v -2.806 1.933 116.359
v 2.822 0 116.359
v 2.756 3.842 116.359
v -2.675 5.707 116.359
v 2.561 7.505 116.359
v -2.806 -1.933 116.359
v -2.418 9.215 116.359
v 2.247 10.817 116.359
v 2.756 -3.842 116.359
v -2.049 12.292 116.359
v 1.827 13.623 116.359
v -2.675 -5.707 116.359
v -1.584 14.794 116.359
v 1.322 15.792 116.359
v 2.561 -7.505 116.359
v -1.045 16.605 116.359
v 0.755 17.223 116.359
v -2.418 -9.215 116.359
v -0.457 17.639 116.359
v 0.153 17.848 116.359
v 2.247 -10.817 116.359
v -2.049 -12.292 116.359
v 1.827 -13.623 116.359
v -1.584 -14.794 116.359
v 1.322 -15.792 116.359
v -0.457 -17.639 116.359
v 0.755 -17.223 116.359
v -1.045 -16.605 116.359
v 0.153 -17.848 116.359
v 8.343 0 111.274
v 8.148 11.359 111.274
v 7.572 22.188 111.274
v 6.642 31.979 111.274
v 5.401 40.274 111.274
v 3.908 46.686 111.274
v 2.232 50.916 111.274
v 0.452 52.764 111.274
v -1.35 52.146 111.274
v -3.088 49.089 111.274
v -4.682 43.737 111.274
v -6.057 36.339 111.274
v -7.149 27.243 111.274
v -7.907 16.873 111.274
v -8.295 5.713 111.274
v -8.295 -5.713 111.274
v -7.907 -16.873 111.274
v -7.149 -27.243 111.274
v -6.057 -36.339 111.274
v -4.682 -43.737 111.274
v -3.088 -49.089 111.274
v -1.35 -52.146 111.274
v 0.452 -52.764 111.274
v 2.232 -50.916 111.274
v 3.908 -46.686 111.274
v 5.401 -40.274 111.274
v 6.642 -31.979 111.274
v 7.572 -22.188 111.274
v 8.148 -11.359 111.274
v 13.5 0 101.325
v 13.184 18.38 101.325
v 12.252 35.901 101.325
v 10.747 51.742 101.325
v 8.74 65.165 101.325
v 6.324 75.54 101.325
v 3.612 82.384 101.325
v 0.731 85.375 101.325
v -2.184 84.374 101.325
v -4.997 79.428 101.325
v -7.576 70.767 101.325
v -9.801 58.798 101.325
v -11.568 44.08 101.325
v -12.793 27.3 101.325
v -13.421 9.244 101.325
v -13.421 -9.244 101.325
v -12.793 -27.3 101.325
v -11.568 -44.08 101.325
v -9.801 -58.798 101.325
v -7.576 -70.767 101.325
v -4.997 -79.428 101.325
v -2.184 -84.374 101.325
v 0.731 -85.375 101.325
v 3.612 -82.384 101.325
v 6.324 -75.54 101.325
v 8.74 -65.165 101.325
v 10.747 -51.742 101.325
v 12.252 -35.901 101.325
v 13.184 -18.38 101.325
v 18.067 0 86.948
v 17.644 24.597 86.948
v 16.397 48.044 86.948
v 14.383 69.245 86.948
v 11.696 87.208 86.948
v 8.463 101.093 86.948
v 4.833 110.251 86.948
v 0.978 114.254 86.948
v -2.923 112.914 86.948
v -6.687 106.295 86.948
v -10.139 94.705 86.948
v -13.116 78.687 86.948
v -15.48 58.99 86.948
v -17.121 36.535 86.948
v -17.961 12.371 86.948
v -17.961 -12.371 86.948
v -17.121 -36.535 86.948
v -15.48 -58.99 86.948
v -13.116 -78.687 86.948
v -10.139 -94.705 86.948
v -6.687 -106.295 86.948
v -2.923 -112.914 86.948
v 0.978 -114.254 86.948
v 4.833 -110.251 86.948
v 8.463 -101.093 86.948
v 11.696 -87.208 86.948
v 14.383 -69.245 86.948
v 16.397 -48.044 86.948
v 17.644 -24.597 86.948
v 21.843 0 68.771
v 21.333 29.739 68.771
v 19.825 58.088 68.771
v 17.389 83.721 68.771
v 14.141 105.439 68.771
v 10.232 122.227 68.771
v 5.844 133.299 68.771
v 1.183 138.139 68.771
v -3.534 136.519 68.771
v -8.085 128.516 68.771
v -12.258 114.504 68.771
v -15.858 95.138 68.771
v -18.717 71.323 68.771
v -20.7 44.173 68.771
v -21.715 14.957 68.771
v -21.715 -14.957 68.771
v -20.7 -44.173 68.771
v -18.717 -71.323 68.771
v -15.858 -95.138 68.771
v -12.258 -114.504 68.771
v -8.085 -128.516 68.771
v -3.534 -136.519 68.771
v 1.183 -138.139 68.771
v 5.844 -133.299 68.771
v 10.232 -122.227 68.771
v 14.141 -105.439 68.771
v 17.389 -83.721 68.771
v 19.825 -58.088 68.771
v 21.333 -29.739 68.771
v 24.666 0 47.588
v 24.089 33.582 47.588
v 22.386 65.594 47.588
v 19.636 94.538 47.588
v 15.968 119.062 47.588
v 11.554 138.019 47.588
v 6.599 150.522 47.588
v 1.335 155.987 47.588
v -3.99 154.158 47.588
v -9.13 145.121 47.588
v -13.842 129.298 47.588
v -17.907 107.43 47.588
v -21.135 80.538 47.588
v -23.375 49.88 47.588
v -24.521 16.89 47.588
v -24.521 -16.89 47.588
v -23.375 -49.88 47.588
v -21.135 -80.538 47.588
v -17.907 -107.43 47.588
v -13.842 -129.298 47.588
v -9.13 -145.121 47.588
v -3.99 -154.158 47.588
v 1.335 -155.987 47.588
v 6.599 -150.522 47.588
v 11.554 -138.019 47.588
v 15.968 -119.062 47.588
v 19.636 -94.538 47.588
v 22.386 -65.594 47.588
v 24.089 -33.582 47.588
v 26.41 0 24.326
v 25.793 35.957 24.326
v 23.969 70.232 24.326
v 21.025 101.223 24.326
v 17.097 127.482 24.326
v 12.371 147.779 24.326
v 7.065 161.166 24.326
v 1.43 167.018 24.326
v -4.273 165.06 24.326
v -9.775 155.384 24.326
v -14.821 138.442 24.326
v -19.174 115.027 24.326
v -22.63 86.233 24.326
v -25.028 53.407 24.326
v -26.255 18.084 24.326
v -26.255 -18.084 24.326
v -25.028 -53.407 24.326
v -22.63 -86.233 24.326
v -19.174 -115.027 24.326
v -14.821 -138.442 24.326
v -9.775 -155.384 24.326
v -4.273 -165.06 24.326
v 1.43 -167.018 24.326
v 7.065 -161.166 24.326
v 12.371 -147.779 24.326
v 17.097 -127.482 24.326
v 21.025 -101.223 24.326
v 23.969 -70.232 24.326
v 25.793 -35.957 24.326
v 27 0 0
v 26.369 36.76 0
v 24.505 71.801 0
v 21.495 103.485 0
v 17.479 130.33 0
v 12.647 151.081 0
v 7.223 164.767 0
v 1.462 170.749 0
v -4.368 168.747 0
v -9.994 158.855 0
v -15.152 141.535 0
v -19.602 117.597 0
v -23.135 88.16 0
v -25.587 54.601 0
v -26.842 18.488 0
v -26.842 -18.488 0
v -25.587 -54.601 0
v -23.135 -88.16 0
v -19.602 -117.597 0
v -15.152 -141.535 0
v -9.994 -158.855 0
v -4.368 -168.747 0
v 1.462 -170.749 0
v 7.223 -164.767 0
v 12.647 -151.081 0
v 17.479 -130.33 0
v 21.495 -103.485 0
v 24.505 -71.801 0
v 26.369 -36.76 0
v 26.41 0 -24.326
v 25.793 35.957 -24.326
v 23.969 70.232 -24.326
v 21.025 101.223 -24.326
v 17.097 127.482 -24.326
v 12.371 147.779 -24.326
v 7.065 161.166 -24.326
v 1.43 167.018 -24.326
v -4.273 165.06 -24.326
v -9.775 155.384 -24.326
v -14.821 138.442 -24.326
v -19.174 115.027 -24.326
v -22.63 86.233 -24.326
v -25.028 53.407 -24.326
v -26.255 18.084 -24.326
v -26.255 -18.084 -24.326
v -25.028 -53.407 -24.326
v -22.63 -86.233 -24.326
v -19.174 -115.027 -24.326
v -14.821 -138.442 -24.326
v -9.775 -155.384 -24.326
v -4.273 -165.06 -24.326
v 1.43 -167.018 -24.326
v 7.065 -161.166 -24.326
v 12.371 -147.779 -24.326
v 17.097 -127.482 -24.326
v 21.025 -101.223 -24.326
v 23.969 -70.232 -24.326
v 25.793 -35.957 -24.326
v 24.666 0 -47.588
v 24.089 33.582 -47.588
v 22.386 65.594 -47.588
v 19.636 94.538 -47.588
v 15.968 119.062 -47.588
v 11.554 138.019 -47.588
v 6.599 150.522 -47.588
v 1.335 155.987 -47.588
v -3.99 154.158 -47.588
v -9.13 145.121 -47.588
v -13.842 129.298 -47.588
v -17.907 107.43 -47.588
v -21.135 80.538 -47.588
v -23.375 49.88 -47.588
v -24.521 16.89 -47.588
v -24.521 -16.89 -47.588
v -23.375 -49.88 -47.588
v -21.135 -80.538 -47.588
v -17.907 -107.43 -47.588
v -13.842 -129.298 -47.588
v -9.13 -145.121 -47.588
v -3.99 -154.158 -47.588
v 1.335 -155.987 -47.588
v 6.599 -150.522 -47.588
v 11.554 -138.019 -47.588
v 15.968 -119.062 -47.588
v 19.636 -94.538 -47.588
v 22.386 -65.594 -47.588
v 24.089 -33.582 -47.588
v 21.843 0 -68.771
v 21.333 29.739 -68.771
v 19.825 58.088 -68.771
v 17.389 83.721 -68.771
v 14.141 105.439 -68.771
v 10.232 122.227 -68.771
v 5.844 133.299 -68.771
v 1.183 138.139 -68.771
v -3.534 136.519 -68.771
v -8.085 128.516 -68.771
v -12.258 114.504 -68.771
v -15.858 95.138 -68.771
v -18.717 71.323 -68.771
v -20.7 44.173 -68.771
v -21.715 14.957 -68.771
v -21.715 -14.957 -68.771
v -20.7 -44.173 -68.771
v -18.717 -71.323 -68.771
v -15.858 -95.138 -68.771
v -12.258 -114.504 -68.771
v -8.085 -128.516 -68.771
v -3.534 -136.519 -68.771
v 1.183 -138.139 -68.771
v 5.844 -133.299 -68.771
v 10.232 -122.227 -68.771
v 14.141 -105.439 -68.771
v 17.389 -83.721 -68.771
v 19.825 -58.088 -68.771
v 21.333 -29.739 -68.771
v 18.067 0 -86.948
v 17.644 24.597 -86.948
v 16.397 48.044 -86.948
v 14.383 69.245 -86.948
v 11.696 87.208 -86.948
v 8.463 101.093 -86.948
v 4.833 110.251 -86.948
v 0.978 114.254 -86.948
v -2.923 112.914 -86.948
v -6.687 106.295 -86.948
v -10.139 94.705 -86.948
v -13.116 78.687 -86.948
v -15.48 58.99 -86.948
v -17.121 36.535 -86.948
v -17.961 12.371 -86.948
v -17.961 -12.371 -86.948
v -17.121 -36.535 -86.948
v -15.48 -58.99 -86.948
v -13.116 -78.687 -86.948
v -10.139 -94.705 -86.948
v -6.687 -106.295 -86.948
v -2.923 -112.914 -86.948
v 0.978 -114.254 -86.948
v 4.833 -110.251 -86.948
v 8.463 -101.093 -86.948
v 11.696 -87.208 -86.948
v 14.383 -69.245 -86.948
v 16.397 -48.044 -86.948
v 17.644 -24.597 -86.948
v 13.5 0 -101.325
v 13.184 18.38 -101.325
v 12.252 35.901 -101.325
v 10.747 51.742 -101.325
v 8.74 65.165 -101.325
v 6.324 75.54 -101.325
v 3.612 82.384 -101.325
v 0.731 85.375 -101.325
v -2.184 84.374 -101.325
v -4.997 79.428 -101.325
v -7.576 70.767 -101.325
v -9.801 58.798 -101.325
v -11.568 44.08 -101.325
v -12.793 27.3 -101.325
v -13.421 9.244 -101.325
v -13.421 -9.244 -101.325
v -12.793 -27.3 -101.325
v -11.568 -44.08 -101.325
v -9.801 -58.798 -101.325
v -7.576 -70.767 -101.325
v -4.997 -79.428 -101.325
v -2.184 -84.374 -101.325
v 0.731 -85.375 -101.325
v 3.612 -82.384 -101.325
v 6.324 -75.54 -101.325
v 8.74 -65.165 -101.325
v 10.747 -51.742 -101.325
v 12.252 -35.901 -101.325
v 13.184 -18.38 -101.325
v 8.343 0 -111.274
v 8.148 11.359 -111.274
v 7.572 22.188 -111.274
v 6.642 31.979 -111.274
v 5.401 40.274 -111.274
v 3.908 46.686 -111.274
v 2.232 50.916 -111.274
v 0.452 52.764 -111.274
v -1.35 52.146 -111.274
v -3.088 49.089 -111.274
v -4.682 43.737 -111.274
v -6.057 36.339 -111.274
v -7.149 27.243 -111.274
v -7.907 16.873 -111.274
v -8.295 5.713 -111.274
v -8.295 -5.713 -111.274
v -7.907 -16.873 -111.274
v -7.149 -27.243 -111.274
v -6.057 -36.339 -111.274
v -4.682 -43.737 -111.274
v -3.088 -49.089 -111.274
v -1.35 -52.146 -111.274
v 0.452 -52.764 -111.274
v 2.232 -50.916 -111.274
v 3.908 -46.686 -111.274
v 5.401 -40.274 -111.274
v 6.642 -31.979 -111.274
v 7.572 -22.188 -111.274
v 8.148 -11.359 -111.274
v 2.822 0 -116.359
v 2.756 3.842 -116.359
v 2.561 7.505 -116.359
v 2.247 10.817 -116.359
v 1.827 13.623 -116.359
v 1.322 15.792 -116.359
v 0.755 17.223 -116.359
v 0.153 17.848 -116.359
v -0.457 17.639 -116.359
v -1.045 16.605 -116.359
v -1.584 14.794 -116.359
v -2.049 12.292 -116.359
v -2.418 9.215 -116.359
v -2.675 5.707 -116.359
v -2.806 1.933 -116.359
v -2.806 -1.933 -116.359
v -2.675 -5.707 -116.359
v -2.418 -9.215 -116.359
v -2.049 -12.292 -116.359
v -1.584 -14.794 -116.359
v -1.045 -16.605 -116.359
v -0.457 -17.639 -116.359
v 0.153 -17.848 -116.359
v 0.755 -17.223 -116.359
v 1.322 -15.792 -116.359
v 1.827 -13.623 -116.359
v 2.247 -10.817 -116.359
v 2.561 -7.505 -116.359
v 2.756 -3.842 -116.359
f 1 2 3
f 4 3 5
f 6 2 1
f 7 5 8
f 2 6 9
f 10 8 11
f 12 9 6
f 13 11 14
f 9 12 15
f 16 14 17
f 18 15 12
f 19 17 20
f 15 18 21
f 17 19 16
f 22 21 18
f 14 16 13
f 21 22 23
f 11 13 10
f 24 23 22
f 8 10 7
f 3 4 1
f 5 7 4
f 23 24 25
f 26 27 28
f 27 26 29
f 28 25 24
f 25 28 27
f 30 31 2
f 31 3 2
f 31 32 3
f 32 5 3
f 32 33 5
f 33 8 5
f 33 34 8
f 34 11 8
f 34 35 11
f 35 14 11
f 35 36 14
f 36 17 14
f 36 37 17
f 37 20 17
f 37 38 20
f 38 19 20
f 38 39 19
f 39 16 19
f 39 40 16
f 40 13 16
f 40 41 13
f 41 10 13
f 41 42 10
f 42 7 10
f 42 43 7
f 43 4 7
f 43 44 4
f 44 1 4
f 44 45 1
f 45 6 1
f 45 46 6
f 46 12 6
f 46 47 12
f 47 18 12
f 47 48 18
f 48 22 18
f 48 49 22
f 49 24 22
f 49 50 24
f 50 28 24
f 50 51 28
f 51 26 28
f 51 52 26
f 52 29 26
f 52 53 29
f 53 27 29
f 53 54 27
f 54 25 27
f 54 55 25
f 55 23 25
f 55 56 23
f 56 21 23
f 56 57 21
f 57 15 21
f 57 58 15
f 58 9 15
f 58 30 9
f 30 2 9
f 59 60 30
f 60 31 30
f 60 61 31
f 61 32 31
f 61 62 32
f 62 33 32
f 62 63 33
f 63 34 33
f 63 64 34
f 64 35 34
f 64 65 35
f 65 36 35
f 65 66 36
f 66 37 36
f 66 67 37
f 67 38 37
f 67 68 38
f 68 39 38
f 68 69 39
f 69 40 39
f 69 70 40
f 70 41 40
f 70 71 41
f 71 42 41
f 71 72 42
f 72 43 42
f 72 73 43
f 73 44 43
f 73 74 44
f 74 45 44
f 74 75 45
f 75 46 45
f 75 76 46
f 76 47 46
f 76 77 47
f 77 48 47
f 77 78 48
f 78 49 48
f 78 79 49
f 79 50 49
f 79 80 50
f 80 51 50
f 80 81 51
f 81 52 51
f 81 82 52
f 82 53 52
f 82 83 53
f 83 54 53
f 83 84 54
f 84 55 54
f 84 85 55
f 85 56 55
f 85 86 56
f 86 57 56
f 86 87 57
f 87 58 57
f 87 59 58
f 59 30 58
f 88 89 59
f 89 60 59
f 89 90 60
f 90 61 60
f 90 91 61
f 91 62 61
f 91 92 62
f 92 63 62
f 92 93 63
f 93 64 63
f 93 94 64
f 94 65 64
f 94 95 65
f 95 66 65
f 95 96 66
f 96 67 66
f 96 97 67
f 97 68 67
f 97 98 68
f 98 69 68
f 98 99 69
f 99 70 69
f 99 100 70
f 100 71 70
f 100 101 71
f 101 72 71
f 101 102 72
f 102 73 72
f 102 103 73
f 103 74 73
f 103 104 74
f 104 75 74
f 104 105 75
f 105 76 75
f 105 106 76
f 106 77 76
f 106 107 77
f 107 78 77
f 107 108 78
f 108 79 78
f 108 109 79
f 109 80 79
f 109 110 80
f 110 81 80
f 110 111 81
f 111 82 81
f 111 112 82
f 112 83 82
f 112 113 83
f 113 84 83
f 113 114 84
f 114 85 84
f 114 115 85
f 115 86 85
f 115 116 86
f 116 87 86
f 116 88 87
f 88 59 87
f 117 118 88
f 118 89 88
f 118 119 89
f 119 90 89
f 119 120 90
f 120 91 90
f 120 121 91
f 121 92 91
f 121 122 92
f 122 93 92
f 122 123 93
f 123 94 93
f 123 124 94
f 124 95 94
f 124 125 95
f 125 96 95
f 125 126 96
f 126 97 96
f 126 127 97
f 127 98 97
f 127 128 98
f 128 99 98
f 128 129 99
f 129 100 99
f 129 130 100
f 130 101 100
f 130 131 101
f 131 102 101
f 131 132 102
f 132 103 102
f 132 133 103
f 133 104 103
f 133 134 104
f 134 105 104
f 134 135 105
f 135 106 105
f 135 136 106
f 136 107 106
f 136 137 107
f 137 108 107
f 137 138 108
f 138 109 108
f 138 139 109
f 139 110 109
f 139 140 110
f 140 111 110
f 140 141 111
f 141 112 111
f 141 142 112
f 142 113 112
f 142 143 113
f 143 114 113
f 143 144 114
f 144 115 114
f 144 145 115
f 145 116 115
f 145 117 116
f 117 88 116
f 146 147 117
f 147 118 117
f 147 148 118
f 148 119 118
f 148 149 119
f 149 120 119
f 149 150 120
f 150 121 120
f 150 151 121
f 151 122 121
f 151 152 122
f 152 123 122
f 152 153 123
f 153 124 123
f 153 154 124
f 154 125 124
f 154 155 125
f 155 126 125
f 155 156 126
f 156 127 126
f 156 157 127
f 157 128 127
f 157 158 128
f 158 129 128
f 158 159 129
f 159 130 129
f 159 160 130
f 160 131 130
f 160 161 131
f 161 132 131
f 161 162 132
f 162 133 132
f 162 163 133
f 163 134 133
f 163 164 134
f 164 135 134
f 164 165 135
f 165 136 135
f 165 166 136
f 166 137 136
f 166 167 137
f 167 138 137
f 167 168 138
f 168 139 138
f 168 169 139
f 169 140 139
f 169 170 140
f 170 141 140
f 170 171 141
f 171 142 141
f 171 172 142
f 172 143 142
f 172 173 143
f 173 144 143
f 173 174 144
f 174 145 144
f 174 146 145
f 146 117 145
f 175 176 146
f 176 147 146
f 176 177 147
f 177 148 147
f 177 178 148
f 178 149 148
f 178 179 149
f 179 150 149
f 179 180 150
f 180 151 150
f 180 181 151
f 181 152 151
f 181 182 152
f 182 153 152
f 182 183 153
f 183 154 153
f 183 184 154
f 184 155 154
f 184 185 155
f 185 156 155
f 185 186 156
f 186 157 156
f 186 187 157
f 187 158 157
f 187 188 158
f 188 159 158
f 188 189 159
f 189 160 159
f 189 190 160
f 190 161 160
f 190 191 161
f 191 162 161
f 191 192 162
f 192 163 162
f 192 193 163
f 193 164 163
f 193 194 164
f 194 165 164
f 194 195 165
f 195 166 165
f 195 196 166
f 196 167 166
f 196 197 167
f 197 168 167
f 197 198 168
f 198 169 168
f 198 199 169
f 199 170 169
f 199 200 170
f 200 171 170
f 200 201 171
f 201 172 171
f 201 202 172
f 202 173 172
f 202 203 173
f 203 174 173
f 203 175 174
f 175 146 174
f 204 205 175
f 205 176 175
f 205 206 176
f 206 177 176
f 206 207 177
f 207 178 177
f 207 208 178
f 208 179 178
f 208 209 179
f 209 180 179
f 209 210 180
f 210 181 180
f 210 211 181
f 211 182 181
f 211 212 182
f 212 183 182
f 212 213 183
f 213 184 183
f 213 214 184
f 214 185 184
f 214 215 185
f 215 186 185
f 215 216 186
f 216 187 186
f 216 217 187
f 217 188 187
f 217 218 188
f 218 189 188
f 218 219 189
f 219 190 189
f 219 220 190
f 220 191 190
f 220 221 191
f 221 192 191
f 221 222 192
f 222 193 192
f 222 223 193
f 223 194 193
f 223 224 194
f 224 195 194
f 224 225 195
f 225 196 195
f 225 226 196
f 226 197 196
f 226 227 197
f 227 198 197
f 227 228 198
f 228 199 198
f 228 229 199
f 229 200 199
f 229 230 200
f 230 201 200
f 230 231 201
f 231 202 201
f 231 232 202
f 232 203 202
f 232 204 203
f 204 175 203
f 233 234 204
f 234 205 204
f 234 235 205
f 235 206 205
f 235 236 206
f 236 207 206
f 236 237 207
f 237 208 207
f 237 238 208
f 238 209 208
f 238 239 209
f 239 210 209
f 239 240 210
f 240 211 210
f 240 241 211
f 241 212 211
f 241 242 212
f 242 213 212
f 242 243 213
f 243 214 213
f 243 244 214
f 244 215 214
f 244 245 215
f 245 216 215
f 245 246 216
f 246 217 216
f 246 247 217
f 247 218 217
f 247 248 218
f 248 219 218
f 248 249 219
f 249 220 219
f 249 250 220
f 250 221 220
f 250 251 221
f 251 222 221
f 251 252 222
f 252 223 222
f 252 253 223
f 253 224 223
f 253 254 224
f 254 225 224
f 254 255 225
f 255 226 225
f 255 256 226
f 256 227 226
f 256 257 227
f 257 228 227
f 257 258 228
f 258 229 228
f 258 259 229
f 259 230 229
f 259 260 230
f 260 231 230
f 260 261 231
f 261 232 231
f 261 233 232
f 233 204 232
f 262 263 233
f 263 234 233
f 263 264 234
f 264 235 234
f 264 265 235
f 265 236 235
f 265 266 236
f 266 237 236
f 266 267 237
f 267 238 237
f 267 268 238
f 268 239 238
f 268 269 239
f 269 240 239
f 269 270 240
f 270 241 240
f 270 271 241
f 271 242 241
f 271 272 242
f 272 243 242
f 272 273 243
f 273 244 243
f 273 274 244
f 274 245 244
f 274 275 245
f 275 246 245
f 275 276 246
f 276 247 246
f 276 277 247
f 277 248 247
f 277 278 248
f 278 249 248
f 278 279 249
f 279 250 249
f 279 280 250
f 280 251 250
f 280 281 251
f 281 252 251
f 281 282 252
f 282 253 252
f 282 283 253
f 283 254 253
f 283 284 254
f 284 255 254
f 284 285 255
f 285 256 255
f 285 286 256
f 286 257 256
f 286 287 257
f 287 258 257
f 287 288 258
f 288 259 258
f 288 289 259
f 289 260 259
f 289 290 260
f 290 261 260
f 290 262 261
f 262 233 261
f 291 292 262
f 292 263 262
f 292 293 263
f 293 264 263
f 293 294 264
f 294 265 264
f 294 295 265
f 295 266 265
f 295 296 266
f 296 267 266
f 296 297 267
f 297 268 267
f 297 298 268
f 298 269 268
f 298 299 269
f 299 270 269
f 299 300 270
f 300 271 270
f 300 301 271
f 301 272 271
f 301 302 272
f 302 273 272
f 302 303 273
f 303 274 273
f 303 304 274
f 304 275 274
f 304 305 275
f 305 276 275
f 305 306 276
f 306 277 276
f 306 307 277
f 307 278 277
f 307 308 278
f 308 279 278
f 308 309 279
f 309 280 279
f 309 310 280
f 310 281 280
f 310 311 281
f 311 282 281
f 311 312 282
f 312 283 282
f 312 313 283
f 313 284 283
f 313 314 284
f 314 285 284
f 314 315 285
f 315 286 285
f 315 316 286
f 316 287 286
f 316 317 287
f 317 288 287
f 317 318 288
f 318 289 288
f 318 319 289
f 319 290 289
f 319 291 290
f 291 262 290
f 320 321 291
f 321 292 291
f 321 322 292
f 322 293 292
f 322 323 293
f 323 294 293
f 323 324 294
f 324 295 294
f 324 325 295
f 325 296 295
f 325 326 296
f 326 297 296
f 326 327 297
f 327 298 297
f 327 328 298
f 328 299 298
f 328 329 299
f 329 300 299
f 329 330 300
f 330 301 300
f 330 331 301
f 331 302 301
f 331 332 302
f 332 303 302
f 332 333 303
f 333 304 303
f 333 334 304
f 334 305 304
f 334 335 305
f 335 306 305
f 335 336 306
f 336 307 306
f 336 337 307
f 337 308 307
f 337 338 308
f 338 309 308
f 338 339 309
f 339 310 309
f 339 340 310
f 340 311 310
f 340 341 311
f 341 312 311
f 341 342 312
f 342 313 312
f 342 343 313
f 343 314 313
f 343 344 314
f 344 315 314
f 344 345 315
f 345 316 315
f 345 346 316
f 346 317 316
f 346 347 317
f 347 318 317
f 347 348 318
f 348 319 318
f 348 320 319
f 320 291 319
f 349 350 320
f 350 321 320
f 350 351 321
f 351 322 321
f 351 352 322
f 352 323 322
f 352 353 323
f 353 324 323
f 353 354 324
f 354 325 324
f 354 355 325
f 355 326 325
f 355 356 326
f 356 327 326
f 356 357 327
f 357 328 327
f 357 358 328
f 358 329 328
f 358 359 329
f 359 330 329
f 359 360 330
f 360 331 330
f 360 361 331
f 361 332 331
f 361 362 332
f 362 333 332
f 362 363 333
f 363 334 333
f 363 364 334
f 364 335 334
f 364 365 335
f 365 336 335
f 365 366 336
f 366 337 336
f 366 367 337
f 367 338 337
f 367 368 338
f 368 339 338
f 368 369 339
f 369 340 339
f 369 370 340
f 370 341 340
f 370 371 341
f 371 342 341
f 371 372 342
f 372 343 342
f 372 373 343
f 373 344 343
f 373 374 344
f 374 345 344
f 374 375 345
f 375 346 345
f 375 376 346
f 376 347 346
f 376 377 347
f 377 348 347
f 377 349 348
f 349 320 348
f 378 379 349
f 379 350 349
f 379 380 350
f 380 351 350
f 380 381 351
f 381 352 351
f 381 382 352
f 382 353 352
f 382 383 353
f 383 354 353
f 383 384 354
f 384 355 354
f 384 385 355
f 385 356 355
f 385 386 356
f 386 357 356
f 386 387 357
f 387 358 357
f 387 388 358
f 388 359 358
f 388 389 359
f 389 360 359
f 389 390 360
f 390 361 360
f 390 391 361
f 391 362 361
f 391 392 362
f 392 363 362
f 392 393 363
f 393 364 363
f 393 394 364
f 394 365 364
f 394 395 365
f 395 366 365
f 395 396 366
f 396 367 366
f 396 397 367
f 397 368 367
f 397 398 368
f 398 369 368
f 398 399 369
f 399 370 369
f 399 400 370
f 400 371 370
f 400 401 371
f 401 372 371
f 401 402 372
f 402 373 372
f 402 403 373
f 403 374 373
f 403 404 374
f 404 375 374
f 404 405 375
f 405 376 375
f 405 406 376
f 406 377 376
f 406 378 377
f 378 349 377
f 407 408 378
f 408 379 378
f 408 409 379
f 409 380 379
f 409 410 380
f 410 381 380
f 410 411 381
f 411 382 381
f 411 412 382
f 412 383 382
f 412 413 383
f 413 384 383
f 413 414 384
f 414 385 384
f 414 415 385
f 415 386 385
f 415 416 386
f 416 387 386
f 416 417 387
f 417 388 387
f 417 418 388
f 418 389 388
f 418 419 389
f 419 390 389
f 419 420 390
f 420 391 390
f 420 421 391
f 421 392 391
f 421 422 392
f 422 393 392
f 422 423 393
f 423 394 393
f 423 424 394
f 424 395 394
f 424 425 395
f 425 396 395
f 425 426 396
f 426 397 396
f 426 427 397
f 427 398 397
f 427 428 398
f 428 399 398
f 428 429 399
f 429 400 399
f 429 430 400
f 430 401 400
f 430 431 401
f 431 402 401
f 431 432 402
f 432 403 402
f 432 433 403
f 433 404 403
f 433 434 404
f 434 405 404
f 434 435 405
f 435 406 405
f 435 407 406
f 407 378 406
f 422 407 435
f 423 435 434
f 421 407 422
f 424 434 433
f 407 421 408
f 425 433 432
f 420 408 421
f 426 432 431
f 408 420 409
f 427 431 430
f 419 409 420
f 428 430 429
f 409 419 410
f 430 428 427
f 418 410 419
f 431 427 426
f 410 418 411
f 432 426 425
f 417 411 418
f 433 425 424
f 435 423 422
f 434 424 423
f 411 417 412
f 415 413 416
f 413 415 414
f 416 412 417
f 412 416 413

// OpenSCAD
// Generated by SolidPython 1.0.1 on 2020-07-29 00:46:46


scale(v = [3, 19, 13]) {
	sphere(r = 9);
}
/***********************************************
*********      SolidPython code:      **********
************************************************
 
# import packages: SolidPython
from solid import *
from solid.utils import *
from itertools import chain, combinations, permutations


class Resize:

    def __init__(self, scad_file):
        self.scad_file = scad_file
        #self.scad_file = import_scad(scad_file)
        # cone/cylinder param:
        self.r1 = 0
        self.r2 = 0
        self.h = 0
        # rectangular prism param:
        self.w = 0
        self.l = 0
        # ellipse param:
        self.r = 0

    # import OpenScad code (file name corresponds to shape)


    # classify shape + parameters
    def assign(self, param1, param2, param3):
        if self.scad_file == 'cone.scad':
            self.r1 = param1
            self.r2 = param2
            self.h = param3
        elif self.scad_file == 'cylinder.scad':
            self.r1 = param1
            self.r2 = param2
            self.h = param3
        elif self.scad_file == 'rectangularPrism.scad':
            self.h = param1
            self.l = param2
            self.w = param3
        else:
            self.r = param1
            self.h = param2

    # resize parameters
    def iterate(self):
        x = range(3, 20, 2)
        i = 1
        if self.scad_file == 'cone.scad':
            tempList = list(permutations(x, 2))
            for temp in tempList:
                param1 = temp[0]
                param2 = temp[1]
                filepath = 'produced_scad_files/' + 'cone' + str(param1) + '_' + str(param2) + '_' + '.scad'
                scad_render_to_file(cylinder(h=param1, r1=param2, r2=0), filepath)

        elif self.scad_file == 'cylinder.scad':
            tempList = list(permutations(x, 3))
            for temp in tempList:
                param1 = temp[0]
                param2 = temp[1]
                filepath = 'produced_scad_files/' + 'cylinder' + str(param1) + '_' + str(param2) + '_' + '.scad'
                scad_render_to_file(cylinder(h=param1, r1=param2, r2=param2), filepath)

        elif self.scad_file == 'rectangularPrism.scad':
            tempList = list(permutations(x, 3))
            for temp in tempList:
                param1 = temp[0]
                param2 = temp[1]
                param3 = temp[2]
                filepath = 'produced_scad_files/' + 'rectangularPrism' + str(param1) + '_' + str(param2) + '_' + str(
                    param3) + '.scad'
                scad_render_to_file(cube(size=(param1, param2, param3)), filepath)

        elif self.scad_file == 'ellipse.scad':
            tempList = list(permutations(x, 4))
            for temp in tempList:
                param1 = temp[0]
                param2 = temp[1]
                param3 = temp[2]
                param4 = temp[3]
                filepath = 'produced_scad_files/' + 'ellipse' + str(param1) + '_' + str(param2) + '_' + str(param3) + '_' + str(param4) + '.scad'
                scad_render_to_file(scale([param1, param2, param3])(sphere(r=param4)), filepath)

    def render_to_scadfile(self):
        scad_render_to_file(scad, 'example.scad') 
 
************************************************/
